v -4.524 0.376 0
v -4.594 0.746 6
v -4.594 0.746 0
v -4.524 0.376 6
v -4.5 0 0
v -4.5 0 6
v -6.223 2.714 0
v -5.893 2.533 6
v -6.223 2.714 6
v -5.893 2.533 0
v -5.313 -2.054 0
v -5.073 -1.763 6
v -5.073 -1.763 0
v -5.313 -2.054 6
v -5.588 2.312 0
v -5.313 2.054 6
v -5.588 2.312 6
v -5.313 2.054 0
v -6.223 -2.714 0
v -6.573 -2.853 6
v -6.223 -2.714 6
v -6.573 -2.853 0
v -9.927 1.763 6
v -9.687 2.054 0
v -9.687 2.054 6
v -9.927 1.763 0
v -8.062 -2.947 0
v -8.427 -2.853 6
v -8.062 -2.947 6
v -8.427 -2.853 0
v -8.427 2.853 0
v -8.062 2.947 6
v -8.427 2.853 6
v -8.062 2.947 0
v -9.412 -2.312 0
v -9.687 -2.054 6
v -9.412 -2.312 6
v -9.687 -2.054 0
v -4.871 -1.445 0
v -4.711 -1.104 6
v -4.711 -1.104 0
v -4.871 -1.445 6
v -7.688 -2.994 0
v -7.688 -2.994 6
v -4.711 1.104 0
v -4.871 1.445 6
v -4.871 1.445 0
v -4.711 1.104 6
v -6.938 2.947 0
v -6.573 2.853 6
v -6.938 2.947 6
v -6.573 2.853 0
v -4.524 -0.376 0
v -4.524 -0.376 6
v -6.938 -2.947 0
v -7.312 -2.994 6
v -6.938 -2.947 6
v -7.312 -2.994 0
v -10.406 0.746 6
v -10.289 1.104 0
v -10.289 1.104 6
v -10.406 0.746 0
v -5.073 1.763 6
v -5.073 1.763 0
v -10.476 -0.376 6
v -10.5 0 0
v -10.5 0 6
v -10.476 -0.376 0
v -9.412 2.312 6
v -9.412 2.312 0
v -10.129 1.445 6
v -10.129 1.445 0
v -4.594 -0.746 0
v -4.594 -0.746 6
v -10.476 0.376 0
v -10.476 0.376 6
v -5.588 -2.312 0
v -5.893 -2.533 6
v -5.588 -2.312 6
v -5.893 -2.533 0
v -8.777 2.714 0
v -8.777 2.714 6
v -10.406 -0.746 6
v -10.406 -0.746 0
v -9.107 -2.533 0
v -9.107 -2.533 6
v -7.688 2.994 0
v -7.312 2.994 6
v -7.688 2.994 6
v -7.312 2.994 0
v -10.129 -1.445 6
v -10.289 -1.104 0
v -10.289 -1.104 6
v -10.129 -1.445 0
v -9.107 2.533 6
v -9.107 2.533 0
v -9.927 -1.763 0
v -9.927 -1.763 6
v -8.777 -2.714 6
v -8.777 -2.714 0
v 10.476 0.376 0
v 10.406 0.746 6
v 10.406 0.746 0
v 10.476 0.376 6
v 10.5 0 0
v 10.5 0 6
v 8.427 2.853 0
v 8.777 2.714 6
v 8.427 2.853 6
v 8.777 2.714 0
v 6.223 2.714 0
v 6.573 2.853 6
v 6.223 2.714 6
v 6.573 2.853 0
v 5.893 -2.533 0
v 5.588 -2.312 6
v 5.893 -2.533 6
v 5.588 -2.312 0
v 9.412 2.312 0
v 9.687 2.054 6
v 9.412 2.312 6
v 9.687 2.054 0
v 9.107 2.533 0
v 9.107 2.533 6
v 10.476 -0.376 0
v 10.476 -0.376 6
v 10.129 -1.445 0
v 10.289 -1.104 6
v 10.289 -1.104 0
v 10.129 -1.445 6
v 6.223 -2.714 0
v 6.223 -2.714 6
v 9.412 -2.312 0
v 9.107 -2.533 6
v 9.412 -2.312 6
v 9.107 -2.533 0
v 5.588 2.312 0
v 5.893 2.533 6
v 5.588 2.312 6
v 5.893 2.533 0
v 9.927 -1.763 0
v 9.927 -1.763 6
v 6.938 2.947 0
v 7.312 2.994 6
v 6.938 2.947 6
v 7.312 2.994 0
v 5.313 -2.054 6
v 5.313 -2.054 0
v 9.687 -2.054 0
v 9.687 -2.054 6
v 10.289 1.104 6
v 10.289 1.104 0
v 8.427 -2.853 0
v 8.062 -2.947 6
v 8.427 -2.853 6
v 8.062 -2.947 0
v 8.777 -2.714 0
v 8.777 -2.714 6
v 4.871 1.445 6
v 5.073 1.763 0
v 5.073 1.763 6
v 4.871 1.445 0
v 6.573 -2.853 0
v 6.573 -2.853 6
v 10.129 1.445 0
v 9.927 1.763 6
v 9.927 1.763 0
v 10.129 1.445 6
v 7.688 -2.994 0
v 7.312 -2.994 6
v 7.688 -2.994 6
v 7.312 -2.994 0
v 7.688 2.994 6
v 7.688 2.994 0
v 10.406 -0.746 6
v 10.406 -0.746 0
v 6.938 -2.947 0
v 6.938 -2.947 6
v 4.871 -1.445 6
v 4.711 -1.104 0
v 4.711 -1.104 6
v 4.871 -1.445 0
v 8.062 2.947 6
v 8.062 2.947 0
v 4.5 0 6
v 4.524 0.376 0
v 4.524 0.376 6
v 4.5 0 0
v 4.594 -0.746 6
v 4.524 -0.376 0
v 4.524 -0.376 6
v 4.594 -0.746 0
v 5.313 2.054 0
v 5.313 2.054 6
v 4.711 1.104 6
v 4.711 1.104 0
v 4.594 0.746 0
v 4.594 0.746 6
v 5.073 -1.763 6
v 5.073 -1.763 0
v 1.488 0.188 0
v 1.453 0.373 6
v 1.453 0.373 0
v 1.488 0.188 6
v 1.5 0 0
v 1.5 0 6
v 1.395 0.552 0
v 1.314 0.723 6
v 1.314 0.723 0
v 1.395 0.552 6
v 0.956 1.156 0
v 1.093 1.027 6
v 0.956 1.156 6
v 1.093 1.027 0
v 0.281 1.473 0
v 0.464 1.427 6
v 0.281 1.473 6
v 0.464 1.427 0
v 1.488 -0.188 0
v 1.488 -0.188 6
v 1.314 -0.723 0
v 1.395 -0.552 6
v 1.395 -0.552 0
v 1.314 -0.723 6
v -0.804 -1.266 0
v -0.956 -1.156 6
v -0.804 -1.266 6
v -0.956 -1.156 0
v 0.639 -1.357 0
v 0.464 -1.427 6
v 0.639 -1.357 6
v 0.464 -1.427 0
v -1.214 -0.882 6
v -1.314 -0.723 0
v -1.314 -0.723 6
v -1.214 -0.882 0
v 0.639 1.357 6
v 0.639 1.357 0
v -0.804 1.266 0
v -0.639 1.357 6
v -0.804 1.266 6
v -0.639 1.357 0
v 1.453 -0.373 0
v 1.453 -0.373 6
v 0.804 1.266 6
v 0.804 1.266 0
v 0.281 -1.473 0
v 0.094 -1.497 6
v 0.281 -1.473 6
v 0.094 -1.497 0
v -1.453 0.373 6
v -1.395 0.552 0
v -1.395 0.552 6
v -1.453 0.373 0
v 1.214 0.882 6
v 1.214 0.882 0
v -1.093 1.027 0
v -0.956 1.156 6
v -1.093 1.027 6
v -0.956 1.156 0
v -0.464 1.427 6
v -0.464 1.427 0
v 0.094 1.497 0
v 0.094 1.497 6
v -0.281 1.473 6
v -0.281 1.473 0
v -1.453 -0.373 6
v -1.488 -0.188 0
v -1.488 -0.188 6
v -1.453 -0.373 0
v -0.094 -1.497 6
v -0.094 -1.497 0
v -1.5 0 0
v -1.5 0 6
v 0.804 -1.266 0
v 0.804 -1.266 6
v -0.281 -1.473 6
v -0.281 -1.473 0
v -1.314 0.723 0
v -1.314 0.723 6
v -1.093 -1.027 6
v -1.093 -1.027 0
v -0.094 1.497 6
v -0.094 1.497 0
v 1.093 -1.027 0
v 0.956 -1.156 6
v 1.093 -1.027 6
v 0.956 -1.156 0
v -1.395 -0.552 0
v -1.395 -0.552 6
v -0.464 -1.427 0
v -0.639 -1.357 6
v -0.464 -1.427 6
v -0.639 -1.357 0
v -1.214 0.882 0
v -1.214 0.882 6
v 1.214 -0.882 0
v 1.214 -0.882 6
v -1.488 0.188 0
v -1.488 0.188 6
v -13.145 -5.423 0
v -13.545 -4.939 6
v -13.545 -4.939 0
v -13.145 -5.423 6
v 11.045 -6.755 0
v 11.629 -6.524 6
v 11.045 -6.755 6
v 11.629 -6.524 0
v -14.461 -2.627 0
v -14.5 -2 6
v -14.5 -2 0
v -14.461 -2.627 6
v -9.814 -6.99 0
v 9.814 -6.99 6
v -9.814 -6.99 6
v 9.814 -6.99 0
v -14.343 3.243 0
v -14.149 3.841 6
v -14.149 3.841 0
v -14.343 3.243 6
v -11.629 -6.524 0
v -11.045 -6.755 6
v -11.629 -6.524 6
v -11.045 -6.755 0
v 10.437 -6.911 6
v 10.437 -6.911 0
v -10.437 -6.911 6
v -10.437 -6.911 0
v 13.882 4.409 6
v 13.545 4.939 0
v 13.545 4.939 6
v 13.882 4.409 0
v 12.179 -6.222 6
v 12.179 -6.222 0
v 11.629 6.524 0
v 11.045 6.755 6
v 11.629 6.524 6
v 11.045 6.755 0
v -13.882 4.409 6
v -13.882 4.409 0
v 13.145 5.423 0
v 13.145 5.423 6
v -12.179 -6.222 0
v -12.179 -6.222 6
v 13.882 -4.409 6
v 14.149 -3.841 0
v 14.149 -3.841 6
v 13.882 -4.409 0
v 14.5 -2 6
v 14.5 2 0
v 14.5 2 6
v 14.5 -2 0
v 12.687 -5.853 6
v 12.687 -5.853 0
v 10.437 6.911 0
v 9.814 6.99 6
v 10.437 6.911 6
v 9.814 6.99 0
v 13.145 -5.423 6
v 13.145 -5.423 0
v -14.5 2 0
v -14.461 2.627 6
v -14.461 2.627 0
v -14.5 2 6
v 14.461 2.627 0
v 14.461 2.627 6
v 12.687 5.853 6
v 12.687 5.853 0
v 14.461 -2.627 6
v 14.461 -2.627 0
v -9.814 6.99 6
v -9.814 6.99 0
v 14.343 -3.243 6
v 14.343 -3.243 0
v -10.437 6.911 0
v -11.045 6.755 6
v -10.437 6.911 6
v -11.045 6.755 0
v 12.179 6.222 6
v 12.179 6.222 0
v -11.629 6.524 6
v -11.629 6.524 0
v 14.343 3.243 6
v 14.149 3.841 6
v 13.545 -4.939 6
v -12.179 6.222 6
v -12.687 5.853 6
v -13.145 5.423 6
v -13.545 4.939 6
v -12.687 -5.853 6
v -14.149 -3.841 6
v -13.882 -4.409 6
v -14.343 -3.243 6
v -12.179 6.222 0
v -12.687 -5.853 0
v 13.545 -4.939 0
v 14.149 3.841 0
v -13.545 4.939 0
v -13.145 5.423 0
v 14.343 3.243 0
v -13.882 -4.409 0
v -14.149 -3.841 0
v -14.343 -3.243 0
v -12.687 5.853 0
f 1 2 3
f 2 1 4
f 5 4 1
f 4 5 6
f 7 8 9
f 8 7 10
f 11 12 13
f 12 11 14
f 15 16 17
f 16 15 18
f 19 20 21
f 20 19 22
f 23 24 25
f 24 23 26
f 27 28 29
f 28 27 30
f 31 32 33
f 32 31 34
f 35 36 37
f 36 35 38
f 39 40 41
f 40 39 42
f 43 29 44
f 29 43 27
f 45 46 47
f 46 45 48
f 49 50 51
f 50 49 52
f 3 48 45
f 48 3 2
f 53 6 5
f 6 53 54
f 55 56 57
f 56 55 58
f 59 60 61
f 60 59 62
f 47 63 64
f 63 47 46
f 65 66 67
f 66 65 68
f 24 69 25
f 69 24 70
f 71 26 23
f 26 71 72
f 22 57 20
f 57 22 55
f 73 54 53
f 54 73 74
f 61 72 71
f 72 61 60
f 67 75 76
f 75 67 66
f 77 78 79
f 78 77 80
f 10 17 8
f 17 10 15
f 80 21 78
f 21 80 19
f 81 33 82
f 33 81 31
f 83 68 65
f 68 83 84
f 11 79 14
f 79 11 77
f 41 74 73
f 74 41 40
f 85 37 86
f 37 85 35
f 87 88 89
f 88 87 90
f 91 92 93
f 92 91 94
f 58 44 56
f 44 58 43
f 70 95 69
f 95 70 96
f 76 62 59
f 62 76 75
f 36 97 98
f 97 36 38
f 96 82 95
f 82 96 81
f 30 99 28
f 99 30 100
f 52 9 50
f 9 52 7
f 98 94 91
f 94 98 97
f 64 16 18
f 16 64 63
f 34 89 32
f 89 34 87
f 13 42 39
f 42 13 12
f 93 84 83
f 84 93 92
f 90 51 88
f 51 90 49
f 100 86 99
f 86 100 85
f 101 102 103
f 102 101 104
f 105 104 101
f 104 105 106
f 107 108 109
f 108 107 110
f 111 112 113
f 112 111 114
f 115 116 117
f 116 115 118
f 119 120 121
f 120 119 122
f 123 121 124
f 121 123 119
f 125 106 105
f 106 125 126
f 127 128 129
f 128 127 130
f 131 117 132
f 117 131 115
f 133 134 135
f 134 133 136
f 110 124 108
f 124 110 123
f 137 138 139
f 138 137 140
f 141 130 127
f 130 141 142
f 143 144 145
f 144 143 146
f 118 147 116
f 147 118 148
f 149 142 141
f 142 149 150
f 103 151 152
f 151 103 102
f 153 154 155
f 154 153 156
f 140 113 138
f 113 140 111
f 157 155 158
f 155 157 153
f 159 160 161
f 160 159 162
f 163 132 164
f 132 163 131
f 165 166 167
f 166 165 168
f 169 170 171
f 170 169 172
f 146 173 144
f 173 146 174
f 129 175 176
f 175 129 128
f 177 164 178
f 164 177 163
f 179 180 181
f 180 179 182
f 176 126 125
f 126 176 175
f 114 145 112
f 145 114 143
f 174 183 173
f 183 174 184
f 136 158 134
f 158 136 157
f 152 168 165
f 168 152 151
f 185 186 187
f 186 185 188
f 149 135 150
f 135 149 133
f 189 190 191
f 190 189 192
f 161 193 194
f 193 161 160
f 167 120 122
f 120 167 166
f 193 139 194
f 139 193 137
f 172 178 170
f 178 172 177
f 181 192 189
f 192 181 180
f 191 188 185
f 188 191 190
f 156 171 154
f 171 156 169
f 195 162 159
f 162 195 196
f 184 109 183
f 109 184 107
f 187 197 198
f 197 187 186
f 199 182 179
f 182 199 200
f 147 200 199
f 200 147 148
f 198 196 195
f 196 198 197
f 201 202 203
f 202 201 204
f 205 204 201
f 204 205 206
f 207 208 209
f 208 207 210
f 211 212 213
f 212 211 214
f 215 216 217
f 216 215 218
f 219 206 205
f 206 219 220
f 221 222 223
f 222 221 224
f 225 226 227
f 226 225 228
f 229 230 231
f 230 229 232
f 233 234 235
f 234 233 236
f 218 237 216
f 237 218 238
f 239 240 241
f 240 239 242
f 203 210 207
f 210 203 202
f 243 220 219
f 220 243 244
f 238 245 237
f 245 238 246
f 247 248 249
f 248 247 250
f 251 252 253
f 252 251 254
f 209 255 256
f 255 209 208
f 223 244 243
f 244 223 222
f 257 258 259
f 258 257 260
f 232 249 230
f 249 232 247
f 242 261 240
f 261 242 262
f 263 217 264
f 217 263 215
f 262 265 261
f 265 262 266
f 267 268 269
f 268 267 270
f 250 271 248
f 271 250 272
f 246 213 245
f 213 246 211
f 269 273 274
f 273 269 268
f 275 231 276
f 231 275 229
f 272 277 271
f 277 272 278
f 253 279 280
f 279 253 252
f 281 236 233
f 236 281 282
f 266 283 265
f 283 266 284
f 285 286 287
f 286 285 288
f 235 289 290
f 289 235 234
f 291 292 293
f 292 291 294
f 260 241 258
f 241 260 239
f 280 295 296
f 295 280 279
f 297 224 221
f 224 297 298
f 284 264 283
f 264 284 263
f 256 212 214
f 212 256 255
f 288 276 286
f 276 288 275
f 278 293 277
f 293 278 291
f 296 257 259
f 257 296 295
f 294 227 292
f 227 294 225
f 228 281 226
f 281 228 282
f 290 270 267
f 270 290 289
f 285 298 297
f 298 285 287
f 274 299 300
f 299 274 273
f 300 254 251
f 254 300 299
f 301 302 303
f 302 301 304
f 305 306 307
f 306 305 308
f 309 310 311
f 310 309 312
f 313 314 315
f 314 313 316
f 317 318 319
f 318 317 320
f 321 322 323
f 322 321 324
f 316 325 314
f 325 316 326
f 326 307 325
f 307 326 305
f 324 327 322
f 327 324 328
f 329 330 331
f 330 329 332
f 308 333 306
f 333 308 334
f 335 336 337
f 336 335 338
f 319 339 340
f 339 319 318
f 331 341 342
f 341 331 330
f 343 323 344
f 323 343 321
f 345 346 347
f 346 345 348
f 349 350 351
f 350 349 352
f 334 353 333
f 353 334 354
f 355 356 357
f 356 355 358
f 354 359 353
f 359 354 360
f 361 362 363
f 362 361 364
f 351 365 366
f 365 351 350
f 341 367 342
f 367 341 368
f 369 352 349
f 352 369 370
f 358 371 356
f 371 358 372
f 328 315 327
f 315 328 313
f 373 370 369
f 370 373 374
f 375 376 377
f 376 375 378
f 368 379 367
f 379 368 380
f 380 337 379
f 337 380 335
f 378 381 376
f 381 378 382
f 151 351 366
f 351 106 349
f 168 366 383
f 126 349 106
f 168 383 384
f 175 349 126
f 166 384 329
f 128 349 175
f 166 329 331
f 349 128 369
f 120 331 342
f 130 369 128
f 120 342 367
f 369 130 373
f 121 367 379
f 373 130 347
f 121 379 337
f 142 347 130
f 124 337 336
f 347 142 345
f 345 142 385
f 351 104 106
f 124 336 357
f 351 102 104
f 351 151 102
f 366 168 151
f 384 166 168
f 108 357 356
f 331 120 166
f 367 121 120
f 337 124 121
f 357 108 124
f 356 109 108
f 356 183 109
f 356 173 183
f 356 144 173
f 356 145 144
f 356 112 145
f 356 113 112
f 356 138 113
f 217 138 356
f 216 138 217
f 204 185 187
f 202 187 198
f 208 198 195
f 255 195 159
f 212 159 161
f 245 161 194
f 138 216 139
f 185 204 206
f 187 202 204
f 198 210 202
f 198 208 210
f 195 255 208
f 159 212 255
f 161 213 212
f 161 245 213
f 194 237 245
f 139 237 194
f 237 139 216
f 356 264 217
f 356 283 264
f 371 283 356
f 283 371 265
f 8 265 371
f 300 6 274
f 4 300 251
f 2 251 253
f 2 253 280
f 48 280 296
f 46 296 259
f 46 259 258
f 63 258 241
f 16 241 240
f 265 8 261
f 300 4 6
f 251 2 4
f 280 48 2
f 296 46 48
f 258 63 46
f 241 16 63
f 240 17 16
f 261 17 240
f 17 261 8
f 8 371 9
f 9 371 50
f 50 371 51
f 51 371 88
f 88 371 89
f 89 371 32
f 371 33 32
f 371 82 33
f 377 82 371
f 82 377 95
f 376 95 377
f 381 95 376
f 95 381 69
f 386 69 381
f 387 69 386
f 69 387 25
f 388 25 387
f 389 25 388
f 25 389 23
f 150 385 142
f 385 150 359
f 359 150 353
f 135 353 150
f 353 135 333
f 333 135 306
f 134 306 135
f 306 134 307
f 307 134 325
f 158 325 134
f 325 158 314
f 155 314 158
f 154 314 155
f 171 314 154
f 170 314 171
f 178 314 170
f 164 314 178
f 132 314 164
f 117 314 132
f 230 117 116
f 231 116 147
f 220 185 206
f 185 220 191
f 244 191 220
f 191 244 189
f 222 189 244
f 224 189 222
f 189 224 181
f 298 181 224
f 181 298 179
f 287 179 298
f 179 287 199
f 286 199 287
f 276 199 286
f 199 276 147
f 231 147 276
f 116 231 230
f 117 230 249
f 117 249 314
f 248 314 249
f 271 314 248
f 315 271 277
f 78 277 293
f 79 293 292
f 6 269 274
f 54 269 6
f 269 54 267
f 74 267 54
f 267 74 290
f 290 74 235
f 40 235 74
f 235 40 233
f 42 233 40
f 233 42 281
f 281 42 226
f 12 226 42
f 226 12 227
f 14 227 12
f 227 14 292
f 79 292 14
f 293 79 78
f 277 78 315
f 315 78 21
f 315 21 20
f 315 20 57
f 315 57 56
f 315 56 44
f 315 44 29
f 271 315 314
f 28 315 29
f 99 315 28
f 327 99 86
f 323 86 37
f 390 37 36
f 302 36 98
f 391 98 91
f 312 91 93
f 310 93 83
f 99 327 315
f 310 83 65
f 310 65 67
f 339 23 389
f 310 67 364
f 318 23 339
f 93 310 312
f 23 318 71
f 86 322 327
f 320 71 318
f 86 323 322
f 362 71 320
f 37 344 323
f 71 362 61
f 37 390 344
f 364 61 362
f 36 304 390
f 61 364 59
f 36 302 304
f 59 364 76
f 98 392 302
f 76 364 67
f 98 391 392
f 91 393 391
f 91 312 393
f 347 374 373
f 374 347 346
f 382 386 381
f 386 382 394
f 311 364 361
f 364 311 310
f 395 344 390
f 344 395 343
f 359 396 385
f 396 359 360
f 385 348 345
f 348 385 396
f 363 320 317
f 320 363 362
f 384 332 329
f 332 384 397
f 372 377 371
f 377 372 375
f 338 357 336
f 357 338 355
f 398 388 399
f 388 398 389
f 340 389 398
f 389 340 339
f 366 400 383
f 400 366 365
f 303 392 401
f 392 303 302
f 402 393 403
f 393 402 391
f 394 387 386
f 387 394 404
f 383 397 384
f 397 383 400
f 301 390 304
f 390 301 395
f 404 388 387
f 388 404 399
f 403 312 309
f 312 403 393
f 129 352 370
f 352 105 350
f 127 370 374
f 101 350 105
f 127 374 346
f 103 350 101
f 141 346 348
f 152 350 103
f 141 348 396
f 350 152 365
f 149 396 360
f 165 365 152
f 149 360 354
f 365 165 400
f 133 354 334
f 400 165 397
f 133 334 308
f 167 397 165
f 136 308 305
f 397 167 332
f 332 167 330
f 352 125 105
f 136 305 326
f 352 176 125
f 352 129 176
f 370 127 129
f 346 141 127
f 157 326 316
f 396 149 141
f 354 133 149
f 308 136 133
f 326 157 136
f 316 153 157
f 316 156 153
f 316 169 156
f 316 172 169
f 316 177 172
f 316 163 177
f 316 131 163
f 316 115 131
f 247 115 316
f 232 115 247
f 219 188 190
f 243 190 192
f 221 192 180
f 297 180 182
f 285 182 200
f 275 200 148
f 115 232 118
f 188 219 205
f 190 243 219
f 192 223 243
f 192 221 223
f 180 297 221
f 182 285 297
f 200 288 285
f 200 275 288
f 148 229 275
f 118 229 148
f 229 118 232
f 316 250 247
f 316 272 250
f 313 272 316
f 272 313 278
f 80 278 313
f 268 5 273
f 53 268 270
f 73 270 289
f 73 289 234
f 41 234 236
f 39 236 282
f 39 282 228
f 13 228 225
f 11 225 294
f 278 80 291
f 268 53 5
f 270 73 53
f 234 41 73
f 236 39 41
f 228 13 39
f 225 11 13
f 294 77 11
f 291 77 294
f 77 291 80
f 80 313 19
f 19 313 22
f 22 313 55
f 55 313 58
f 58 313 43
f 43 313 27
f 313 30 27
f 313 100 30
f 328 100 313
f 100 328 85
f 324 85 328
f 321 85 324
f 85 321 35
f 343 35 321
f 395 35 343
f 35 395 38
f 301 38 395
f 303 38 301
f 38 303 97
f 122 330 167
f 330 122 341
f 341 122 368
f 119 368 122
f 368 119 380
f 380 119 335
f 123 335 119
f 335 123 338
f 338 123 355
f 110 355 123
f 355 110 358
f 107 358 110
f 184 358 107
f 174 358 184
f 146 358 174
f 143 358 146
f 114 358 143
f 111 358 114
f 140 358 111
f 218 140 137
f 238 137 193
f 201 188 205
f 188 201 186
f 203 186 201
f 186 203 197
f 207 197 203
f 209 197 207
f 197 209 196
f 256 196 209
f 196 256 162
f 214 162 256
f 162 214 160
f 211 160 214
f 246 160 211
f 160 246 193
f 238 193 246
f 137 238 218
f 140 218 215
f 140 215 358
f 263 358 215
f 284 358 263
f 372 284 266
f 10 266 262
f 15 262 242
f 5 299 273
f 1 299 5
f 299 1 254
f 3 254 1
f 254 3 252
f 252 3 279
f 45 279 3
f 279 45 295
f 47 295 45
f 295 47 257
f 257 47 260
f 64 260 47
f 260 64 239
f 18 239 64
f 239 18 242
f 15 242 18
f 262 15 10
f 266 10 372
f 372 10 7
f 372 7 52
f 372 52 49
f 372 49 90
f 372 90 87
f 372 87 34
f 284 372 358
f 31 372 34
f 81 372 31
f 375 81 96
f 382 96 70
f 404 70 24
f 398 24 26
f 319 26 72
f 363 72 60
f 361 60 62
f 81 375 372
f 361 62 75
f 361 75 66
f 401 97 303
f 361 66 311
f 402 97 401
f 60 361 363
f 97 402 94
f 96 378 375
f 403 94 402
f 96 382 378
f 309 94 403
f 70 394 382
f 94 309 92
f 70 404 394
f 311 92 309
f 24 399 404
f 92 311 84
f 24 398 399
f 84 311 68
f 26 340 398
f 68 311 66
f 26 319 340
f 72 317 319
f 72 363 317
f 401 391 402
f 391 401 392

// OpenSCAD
$fn = 50;


difference() {
	union() {
		translate(v = [0, 0, 0]) {
			rotate(a = [0, 0, 0]) {
				hull() {
					translate(v = [-9.5000000000, 2.0000000000, 0]) {
						rotate(a = [0, 0, 0]) {
							translate(v = [0, 0, 0]) {
								rotate(a = [0, 0, 0]) {
									cylinder(h = 6, r = 5);
								}
							}
						}
					}
					translate(v = [9.5000000000, 2.0000000000, 0]) {
						rotate(a = [0, 0, 0]) {
							translate(v = [0, 0, 0]) {
								rotate(a = [0, 0, 0]) {
									cylinder(h = 6, r = 5);
								}
							}
						}
					}
					translate(v = [-9.5000000000, -2.0000000000, 0]) {
						rotate(a = [0, 0, 0]) {
							translate(v = [0, 0, 0]) {
								rotate(a = [0, 0, 0]) {
									cylinder(h = 6, r = 5);
								}
							}
						}
					}
					translate(v = [9.5000000000, -2.0000000000, 0]) {
						rotate(a = [0, 0, 0]) {
							translate(v = [0, 0, 0]) {
								rotate(a = [0, 0, 0]) {
									cylinder(h = 6, r = 5);
								}
							}
						}
					}
				}
			}
		}
	}
	union() {
		translate(v = [-7.5000000000, 0.0000000000, 0]) {
			rotate(a = [0, 0, 0]) {
				translate(v = [0, 0, -50]) {
					rotate(a = [0, 0, 0]) {
						cylinder(h = 100, r = 3.0000000000);
					}
				}
			}
		}
		translate(v = [7.5000000000, 0.0000000000, 0]) {
			rotate(a = [0, 0, 0]) {
				translate(v = [0, 0, -50]) {
					rotate(a = [0, 0, 0]) {
						cylinder(h = 100, r = 3.0000000000);
					}
				}
			}
		}
		translate(v = [-7.5000000000, 0.0000000000, 0]) {
			rotate(a = [0, 0, 0]) {
				translate(v = [0, 0, -50]) {
					rotate(a = [0, 0, 0]) {
						cylinder(h = 100, r = 1.5000000000);
					}
				}
			}
		}
		translate(v = [0.0000000000, 0.0000000000, 0]) {
			rotate(a = [0, 0, 0]) {
				translate(v = [0, 0, -50]) {
					rotate(a = [0, 0, 0]) {
						cylinder(h = 100, r = 1.5000000000);
					}
				}
			}
		}
		translate(v = [7.5000000000, 0.0000000000, 0]) {
			rotate(a = [0, 0, 0]) {
				translate(v = [0, 0, -50]) {
					rotate(a = [0, 0, 0]) {
						cylinder(h = 100, r = 1.5000000000);
					}
				}
			}
		}
	}
}
